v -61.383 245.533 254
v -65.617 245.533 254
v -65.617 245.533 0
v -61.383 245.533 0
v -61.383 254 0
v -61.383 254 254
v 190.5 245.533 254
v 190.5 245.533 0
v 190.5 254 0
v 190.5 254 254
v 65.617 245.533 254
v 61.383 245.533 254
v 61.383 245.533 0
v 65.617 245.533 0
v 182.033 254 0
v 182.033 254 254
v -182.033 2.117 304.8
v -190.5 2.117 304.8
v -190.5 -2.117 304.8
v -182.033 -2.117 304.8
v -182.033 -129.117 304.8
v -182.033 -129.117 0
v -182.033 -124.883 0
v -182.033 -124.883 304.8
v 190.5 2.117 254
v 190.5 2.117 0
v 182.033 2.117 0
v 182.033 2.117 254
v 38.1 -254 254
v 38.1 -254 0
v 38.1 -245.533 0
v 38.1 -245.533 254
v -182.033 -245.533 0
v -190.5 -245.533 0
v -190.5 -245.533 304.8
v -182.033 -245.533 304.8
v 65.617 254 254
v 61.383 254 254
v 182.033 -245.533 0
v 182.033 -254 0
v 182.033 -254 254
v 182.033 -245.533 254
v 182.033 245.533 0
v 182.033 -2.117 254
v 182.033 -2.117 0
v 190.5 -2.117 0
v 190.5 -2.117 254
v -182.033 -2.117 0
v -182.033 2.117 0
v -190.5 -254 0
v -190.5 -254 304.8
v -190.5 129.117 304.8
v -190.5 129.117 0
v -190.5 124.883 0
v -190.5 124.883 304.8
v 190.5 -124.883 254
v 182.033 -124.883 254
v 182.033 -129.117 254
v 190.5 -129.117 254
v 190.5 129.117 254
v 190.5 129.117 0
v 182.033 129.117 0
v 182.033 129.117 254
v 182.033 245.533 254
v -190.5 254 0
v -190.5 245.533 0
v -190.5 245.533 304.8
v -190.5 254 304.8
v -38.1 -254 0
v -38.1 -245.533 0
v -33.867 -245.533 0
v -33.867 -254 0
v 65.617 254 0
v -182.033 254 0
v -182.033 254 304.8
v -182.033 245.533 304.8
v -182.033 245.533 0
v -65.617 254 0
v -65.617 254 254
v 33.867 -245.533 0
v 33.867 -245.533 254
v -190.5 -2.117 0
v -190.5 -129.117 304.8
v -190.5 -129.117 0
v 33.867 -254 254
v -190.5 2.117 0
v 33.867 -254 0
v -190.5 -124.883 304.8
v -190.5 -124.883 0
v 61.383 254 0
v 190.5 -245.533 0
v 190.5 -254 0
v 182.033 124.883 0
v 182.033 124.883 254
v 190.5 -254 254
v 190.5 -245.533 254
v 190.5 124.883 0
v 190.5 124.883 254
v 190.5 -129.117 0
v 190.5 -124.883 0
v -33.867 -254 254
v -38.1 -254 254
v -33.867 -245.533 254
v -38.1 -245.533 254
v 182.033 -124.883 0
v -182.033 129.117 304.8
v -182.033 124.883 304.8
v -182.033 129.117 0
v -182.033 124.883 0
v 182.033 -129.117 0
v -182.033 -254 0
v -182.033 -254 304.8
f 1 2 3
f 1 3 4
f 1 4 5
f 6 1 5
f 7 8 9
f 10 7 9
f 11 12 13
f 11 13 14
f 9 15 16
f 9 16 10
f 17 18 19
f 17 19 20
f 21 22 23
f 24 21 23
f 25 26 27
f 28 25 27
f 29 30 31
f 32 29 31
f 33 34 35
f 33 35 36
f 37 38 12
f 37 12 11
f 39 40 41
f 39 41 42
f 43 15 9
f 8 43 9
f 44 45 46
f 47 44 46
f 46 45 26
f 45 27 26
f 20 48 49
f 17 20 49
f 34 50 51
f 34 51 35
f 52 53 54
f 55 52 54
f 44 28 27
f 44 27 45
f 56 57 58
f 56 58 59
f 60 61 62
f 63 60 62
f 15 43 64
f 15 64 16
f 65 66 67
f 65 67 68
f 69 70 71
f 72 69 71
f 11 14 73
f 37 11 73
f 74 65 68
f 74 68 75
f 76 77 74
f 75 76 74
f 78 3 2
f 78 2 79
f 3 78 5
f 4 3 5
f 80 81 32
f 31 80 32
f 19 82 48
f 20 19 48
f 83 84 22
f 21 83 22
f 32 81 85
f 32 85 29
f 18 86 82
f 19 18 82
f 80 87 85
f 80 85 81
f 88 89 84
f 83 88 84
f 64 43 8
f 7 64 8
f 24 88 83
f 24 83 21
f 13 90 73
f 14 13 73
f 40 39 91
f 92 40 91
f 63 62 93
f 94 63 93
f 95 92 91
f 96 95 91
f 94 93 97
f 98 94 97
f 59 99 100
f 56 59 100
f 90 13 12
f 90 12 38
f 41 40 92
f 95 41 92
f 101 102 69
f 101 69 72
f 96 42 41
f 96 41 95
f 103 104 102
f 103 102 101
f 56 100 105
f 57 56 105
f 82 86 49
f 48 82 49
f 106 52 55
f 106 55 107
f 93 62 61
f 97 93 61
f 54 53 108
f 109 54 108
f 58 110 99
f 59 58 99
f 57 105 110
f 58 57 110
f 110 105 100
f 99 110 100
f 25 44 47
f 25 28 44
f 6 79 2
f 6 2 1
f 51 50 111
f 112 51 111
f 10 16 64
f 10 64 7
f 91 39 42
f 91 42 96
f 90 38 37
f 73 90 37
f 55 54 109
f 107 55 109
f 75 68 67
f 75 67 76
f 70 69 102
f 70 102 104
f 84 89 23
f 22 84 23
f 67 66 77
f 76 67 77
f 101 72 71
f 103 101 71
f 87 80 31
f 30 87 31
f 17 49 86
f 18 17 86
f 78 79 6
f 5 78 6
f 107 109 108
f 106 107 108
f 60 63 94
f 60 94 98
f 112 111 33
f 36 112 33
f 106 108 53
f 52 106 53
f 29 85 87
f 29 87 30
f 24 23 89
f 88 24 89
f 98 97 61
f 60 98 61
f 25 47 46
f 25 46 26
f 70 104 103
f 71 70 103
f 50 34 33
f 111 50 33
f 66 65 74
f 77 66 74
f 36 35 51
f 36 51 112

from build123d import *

# Parameters (mm, degrees)
F0_W     = 8.466667
F0_H     = 8.466667
F1_DEPTH = 304.8
F0_W_2   = 4.233333
F0_W_3   = 4.233334
F2_DEPTH = 254


with BuildPart() as f1:
    # F0 (on Top) → F1 (new body)
    with BuildSketch(Plane.XY):
        with Locations((-186.266666, 249.766666)):
            Rectangle(F0_W, F0_H)
        Polygon((-190.5, 129.116667), (-190.5, 127), (-190.5, 124.883333), (-182.033333, 124.883333), (-182.033333, 129.116667), align=None)
        Polygon((-190.5, 2.116667), (-190.5, 0), (-190.5, -2.116667), (-182.033333, -2.116667), (-182.033333, 2.116667), align=None)
        Polygon((-190.5, -124.883333), (-190.5, -127), (-190.5, -129.116667), (-182.033333, -129.116667), (-182.033333, -124.883333), align=None)
        with Locations((-186.266666, -249.766666)):
            Rectangle(F0_W, F0_H)
    extrude(amount=F1_DEPTH)


with BuildPart() as f2:
    # F0 (on Top) → F2 (new body)
    with BuildSketch(Plane.XY):
        with Locations((-35.983334, -249.766666)):
            Rectangle(F0_W_2, F0_H)
        with Locations((35.983334, -249.766666)):
            Rectangle(F0_W_2, F0_H)
        with Locations((186.266666, -249.766666)):
            Rectangle(F0_W, F0_H)
        Polygon((190.5, -127), (190.5, -124.883333), (182.033333, -124.883333), (182.033333, -129.116667), (190.5, -129.116667), align=None)
        Polygon((182.033333, -2.116667), (190.5, -2.116667), (190.5, 0), (190.5, 2.116667), (182.033333, 2.116667), align=None)
        with Locations((-63.5, 249.766666)):
            Rectangle(F0_W_3, F0_H)
        with Locations((63.5, 249.766666)):
            Rectangle(F0_W_3, F0_H)
        with Locations((186.266666, 249.766666)):
            Rectangle(F0_W, F0_H)
        Polygon((190.5, 124.883333), (190.5, 127), (190.5, 129.116667), (182.033333, 129.116667), (182.033333, 124.883333), align=None)
    extrude(amount=F2_DEPTH)


solid = Compound([f1.part, f2.part])
